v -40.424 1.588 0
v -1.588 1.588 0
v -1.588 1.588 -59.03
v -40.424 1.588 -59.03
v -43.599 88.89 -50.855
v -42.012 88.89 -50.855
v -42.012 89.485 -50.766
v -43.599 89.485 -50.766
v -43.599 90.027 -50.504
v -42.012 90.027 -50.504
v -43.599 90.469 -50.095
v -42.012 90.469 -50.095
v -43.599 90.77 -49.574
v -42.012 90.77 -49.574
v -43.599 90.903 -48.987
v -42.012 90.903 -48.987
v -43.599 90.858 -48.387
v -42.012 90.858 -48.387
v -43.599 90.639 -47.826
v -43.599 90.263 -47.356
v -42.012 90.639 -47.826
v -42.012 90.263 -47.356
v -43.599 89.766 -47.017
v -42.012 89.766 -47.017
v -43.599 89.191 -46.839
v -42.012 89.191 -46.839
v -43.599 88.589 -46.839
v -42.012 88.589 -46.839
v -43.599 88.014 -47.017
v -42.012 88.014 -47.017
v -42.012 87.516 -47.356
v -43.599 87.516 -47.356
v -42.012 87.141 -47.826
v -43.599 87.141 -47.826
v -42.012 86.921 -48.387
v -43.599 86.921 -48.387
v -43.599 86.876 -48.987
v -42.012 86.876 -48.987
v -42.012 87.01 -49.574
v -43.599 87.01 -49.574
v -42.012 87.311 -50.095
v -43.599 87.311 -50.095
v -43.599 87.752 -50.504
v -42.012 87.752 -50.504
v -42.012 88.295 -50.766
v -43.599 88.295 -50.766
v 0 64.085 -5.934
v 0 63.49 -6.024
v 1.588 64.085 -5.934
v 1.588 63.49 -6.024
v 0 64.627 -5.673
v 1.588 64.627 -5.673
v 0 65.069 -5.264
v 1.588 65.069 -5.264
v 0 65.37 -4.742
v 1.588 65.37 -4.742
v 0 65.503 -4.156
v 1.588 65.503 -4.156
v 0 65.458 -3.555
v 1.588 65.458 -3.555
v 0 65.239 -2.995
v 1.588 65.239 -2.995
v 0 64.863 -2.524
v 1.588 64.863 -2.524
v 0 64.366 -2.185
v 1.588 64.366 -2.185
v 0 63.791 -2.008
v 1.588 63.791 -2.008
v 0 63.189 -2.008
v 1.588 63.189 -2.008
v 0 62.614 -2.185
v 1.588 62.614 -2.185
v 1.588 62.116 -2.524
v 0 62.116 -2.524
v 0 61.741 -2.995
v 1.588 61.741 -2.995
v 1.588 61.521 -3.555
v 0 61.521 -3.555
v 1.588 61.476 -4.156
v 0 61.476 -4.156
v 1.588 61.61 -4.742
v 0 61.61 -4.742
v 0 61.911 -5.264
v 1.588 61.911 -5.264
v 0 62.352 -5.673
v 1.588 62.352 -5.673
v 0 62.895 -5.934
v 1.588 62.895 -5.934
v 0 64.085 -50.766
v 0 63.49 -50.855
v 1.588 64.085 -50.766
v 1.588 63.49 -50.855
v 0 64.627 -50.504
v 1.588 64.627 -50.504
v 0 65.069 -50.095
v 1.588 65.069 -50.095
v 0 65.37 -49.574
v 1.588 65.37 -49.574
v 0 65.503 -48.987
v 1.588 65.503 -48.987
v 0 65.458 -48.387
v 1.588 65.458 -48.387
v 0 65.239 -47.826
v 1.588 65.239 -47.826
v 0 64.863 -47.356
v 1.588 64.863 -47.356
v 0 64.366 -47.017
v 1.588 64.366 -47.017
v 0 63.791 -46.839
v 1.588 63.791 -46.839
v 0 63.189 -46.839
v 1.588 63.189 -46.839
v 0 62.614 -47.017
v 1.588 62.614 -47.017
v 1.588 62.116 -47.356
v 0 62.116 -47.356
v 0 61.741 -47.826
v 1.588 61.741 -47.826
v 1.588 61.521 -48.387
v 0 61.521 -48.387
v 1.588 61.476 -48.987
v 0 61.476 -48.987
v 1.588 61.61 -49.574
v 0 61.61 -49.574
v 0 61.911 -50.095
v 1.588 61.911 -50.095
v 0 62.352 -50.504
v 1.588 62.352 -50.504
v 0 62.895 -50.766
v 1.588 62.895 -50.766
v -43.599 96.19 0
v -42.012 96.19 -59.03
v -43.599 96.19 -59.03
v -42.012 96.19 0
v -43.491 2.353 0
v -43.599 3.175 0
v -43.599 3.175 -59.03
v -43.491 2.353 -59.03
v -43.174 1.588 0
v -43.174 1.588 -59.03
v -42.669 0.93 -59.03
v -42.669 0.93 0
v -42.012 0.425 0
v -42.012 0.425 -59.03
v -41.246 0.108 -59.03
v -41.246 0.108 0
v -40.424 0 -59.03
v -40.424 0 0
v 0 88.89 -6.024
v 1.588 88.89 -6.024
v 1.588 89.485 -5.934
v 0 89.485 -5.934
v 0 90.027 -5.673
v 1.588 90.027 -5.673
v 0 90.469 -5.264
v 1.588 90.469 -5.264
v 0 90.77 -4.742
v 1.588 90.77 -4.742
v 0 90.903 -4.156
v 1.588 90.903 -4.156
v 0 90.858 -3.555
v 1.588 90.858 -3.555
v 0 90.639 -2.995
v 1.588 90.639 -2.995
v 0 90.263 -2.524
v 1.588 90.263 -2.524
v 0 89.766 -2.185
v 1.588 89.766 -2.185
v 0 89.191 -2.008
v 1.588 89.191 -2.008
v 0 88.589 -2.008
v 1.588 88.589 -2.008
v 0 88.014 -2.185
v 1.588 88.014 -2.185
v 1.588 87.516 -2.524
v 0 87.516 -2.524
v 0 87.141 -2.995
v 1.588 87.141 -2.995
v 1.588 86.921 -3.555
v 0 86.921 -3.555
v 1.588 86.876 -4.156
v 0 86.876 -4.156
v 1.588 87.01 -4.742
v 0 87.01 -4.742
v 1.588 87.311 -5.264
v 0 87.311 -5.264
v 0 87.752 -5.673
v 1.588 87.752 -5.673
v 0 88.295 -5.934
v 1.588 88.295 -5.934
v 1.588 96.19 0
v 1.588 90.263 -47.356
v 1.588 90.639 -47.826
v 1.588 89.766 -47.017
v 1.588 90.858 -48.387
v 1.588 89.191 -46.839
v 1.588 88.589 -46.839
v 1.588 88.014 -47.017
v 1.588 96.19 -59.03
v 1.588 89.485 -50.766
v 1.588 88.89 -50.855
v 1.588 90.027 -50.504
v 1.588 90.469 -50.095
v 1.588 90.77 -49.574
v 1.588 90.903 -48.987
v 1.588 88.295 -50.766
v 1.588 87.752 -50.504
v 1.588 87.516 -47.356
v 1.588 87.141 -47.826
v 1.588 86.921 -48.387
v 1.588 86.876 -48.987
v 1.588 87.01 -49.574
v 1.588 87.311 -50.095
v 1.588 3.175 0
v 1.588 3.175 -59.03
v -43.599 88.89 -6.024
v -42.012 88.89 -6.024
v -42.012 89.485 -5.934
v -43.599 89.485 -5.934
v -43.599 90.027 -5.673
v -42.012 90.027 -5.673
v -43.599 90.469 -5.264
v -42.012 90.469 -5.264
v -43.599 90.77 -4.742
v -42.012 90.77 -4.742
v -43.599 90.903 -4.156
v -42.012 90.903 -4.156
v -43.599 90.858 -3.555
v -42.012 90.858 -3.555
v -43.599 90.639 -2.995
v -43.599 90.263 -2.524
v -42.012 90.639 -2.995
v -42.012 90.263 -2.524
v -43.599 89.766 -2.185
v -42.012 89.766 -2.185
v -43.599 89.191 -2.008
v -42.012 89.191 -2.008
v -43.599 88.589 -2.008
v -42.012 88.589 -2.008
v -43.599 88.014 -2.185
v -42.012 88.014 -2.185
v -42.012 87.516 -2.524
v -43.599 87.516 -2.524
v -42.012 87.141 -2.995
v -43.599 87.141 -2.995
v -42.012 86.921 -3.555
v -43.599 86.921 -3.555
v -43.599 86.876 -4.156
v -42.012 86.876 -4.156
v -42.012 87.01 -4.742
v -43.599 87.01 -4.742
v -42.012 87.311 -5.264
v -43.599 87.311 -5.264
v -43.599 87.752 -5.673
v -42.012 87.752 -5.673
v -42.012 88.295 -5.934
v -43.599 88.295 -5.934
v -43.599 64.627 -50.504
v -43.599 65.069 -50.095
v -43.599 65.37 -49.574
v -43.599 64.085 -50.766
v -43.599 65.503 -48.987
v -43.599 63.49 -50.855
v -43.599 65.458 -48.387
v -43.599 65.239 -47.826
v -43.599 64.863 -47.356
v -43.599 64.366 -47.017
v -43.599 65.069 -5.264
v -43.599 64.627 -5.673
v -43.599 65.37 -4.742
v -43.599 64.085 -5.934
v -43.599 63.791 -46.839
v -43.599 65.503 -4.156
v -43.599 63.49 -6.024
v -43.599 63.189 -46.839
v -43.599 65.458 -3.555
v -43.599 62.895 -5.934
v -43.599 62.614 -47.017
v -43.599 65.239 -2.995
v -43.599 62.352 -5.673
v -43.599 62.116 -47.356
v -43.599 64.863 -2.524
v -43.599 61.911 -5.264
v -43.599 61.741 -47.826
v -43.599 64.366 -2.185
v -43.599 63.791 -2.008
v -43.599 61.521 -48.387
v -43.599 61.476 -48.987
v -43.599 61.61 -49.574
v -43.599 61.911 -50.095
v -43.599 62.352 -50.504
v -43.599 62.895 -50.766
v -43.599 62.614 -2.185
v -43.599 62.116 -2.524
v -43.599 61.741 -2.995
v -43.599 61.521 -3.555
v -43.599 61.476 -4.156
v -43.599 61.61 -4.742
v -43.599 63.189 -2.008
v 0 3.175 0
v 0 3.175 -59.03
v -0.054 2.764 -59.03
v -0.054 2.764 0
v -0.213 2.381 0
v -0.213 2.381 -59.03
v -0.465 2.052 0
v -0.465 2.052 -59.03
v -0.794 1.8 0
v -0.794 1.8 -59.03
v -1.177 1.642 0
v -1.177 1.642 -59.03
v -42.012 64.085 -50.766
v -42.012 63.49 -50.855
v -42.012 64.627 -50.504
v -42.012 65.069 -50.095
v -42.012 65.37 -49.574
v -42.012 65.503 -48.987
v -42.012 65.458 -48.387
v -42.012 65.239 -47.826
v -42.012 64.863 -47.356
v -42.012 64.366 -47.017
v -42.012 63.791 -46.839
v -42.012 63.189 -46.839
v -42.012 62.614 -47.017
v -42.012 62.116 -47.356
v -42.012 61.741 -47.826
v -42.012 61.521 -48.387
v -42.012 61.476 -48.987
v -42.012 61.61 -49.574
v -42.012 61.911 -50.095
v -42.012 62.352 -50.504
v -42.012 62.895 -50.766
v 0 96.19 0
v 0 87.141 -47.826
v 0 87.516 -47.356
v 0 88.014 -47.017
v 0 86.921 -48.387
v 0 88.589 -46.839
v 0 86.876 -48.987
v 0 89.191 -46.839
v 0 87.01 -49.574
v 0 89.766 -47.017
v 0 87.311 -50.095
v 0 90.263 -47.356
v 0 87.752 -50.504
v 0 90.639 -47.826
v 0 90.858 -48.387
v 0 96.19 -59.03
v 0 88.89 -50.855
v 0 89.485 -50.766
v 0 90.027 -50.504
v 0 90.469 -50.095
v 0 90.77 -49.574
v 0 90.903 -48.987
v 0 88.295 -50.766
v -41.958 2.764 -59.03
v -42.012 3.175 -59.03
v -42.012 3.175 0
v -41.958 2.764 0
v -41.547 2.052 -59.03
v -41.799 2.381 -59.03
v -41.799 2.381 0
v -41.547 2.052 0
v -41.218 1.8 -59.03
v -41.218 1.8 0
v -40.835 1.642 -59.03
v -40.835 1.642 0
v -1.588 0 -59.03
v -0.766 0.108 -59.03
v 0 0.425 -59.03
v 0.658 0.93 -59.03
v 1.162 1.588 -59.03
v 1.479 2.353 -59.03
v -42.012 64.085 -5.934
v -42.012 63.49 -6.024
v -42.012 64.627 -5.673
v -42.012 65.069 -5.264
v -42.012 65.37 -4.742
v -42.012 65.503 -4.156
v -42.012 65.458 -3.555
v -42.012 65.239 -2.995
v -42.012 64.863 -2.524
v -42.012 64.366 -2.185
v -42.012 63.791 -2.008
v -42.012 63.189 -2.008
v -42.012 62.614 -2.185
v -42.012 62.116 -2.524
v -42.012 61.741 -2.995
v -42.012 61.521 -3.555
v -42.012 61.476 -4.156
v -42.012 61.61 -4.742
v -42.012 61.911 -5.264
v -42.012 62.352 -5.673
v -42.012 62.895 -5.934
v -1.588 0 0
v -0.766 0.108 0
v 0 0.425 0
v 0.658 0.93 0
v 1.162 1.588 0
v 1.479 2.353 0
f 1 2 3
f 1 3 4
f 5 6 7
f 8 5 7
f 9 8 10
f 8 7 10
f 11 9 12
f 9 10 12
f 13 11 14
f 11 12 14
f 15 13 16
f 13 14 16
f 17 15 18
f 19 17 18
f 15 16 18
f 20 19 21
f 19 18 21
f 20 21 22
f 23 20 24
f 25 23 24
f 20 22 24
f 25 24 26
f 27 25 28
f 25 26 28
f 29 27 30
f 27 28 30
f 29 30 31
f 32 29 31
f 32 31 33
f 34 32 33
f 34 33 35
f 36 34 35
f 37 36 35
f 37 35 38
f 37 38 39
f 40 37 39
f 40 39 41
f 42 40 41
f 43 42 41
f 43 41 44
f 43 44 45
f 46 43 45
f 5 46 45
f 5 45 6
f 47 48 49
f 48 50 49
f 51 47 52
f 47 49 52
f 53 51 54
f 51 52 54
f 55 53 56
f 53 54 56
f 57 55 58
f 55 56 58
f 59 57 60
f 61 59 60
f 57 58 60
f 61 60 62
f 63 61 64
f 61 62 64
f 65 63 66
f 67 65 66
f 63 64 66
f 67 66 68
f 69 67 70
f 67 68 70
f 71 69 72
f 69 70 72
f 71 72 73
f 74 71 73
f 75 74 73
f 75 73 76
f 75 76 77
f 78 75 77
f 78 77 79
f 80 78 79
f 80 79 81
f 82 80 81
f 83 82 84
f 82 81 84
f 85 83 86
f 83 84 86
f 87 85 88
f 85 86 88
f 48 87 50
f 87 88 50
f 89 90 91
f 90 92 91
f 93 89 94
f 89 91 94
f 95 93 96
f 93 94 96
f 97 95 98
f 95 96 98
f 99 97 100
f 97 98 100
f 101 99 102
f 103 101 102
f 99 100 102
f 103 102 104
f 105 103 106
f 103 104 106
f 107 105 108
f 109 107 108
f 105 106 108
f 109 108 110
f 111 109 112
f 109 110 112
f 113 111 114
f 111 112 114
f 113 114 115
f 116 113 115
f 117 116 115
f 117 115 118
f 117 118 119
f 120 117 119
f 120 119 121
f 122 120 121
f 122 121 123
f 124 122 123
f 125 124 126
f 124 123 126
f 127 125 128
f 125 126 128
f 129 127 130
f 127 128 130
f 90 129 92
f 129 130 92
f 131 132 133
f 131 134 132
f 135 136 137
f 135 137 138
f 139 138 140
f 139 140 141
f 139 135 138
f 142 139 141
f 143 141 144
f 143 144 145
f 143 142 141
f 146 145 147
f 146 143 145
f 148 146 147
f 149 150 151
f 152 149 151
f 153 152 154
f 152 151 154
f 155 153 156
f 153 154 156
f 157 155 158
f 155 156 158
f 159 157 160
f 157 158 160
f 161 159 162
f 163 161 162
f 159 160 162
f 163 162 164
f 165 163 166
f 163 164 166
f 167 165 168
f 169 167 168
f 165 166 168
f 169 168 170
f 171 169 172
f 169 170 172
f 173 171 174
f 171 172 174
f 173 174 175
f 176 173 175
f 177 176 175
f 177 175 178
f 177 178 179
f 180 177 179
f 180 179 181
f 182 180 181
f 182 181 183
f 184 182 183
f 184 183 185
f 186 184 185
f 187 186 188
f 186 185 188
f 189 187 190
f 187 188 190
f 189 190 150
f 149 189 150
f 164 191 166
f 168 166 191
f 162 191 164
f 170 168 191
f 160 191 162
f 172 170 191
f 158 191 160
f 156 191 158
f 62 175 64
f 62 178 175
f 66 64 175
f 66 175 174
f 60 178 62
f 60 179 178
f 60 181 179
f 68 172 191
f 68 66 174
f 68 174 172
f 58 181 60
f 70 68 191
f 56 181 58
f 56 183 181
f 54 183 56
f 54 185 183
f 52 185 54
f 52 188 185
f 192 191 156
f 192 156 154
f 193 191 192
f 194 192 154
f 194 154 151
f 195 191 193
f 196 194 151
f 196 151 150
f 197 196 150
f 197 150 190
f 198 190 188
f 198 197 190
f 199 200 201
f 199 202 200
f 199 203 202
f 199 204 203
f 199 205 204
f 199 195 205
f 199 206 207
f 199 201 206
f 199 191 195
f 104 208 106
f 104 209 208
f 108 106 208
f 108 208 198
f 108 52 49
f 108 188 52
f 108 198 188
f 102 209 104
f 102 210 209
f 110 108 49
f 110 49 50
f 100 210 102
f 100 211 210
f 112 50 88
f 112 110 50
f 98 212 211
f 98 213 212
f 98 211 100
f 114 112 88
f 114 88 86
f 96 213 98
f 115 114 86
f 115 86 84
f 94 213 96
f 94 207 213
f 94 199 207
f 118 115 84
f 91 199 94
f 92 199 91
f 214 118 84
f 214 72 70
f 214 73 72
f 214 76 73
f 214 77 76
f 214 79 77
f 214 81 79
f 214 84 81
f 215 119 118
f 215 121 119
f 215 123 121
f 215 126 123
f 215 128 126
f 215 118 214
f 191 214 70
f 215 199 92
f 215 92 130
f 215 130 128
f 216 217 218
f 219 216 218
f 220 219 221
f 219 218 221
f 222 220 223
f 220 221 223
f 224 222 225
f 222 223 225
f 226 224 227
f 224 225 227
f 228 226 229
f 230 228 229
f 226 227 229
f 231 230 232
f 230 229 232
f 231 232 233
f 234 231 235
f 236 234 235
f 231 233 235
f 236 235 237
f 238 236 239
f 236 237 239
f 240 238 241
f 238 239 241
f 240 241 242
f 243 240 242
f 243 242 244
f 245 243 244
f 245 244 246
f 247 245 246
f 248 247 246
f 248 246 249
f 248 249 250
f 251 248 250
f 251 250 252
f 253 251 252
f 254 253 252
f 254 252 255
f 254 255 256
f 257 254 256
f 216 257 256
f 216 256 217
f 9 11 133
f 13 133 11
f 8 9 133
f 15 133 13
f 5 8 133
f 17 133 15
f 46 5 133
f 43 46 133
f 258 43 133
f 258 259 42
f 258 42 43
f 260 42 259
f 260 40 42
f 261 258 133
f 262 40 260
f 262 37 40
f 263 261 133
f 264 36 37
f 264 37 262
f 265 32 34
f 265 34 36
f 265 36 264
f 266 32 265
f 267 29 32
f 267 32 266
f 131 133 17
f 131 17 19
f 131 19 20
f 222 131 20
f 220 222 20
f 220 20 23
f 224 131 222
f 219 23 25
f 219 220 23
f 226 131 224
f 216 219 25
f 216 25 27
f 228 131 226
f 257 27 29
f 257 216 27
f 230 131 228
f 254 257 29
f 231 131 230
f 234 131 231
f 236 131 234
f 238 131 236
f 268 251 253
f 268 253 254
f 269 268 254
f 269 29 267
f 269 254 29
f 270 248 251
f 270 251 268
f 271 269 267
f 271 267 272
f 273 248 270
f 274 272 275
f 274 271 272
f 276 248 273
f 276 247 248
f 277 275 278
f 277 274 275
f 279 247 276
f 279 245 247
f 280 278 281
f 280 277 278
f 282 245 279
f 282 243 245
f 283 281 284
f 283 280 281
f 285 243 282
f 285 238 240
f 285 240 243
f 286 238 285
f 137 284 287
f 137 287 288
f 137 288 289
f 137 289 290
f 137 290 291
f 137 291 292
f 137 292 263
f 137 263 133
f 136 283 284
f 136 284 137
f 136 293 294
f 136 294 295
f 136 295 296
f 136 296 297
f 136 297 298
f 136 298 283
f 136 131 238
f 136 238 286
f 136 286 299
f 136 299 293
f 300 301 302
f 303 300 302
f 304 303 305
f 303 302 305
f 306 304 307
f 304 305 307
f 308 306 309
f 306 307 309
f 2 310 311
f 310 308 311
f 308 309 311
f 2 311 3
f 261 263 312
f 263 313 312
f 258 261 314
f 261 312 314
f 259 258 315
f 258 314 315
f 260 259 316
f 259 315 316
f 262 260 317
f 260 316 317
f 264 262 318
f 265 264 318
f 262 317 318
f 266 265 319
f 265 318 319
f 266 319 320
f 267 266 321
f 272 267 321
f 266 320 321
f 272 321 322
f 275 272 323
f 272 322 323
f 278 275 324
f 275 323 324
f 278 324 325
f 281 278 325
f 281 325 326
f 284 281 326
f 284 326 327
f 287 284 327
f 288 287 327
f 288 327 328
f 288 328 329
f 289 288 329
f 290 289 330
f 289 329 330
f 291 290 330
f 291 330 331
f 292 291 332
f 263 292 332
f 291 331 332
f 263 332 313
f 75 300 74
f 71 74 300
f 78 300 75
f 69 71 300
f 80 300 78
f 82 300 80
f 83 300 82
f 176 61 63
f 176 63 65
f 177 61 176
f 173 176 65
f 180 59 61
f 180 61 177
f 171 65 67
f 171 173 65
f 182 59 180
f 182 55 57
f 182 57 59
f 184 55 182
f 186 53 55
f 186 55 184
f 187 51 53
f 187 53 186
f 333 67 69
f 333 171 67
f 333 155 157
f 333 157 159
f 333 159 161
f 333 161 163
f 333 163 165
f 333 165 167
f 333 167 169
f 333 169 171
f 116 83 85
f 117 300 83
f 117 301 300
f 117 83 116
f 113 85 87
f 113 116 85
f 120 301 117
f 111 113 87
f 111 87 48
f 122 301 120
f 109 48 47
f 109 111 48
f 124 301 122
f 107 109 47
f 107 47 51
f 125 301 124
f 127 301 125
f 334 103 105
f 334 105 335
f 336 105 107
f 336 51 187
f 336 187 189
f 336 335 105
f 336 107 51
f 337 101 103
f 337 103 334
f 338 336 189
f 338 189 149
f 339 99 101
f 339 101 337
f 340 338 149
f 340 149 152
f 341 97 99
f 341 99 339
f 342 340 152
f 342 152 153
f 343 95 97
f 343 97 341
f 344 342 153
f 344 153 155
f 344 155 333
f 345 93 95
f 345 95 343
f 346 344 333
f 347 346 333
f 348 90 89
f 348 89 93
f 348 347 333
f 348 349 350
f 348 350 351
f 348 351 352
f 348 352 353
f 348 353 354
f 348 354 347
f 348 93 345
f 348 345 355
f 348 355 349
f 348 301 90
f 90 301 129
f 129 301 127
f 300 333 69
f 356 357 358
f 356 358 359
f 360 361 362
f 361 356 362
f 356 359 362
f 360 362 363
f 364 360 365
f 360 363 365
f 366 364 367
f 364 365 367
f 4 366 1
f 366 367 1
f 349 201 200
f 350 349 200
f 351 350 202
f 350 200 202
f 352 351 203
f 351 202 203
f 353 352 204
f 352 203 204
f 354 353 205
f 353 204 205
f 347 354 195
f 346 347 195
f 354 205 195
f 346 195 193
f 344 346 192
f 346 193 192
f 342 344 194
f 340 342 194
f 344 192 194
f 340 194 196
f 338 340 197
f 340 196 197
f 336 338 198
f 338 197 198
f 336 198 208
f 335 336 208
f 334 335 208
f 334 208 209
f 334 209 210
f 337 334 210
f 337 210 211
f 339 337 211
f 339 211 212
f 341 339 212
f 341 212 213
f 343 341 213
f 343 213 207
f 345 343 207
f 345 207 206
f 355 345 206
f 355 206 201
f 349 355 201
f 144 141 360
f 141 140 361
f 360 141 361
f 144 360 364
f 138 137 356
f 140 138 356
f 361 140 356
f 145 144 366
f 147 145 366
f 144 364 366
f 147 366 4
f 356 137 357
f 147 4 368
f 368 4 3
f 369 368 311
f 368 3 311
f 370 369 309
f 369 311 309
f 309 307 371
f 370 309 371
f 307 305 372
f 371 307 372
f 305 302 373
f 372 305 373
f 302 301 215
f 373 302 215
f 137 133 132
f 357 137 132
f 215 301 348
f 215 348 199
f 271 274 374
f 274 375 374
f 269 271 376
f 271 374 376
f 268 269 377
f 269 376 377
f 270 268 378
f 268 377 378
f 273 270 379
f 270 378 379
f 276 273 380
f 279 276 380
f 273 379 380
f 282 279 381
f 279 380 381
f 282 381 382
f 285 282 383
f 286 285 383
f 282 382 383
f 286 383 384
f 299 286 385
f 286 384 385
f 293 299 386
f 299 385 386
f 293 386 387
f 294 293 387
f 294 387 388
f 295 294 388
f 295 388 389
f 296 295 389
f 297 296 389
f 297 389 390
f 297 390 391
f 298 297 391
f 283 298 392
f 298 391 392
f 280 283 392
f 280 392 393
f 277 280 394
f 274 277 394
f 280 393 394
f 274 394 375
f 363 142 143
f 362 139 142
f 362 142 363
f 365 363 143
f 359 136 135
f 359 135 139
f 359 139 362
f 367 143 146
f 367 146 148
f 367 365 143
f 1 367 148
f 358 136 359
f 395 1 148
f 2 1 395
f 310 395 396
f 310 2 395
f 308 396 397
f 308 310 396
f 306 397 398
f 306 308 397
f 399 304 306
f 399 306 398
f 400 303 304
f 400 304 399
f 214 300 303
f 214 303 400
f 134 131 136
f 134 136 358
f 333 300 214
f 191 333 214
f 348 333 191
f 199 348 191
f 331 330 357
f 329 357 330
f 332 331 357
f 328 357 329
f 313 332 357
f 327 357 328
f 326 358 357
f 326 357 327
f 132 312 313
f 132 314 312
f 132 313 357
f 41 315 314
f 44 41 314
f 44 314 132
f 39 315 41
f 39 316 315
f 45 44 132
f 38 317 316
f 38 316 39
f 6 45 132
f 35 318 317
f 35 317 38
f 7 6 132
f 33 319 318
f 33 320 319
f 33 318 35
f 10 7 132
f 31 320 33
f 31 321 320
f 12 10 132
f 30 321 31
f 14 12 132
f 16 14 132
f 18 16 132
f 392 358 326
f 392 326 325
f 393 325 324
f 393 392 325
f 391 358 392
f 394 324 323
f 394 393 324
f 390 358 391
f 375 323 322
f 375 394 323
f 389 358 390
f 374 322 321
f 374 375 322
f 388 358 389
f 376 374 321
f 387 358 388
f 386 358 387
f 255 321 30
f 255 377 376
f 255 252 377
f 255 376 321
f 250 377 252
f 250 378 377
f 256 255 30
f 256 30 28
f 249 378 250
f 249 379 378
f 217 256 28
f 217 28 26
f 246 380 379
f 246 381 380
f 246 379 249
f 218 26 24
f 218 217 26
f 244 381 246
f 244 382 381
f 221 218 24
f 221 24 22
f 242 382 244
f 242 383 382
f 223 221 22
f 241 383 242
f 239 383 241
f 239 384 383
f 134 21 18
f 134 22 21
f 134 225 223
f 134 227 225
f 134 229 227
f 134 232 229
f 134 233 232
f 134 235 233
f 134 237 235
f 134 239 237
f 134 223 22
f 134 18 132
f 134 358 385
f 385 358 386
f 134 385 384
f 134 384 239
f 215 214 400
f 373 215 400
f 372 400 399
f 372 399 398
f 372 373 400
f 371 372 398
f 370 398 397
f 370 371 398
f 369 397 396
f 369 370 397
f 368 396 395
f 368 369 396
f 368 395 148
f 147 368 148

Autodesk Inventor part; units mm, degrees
ref_plane "YZ Plane" through (0, 0, 0) normal (1, 0, 0) x (0, 1, 0)
ref_plane "XZ Plane" through (0, 0, 0) normal (0, 1, 0) x (-1, 0, 0)
ref_plane "XY Plane" through (0, 0, 0) normal (0, 0, 1) x (1, 0, 0)
sketch "Sketch1" plane through (0, 0, 0) normal (0, 1, 0) x (-1, 0, 0)
  line L0 (0, 0) -> (42.0116, 0)
  line L1 (42.0116, 0) -> (42.0116, -59.0296)
  line L2 (42.0116, -59.0296) -> (0, -59.0296)
  line L3 (0, -59.0296) -> (0, 0)
  dimension "d0" = 42.0116
  dimension "d1" = 59.0296
extrude "Plate1" add sketch "Sketch1" along normal blind 1.5875
sketch "Sketch2" plane through (-42.0116, 1.5875, 0) normal (-1, 0, 0) x (0, -1, 0)
  line L0 (0, -59.0296) -> (0, 0)
  line L1 (0, 0) -> (-94.6023, 0)
  line L2 (-94.6023, 0) -> (-94.6023, -59.0296)
  line L3 (-94.6023, -59.0296) -> (0, -59.0296)
edge flange "Flange1" height 96.1898 angle 90 thickness 1.5875 bend radius 1.5875 thickness toward (-1, 0, 0) relief straight relief width 1.5875 relief depth 0.7937 corner gap 1.5875 corner form 0 edges at (-42.0116, 1.5875, -29.5148) (0, 1.5875, -29.5148) wall of the first edge with corners at (-42.0116, 1.5875, -59.0296) (-42.0116, 1.5875, 0) (-42.0116, 96.1898, 0) (-42.0116, 96.1898, -59.0296)
bend "Bend1"
corner "Corner1"
sketch "Sketch3" plane through (1.5875, 96.1898, 0) normal (1, 0, 0) x (0, 0, -1)
  circle A0 centre (4.0046, -7.3) radius 2.0193 projected
  circle A1 centre (48.836, -7.3) radius 2.0193 projected
  circle A2 centre (48.836, -32.7) radius 2.0193 projected
  circle A3 centre (48.836, -32.7) radius 2.0193 projected
  circle A4 centre (4.0046, -32.7) radius 2.0193 projected
  point P0 (0, -96.1898)
extrude "Extrusion1" cut sketch "Sketch3" against normal up to surface (45.1866 mm away)
equation "\"d3\" = BendReliefWidth"
equation "\"d4\" = BendReliefDepth"
equation "\"d5\" = MinimumRemnant"
equation "\"d6\" = BendRadius"
equation "\"d9\" = BendRadius"
equation "\"d10\" = CornerReliefSize"
equation "\"d11\" = GapSize"
equation "\"d12\" = JacobiRadiusSize"
equation "\"BendRadius\" = Thickness"
equation "\"BendReliefWidth\" = Thickness"
equation "\"BendReliefDepth\" = 0.5 * Thickness"
equation "\"CornerReliefSize\" = 4 * Thickness"
equation "\"MinimumRemnant\" = 2 * Thickness"
equation "\"TransitionRadius\" = BendRadius"
equation "\"JacobiRadiusSize\" = Thickness"
equation "\"GapSize\" = Thickness"
equation "\"d2\" = BendRadius"
equation "\"Thickness\" = 1.5875"
properties part number "lifterMountB"
